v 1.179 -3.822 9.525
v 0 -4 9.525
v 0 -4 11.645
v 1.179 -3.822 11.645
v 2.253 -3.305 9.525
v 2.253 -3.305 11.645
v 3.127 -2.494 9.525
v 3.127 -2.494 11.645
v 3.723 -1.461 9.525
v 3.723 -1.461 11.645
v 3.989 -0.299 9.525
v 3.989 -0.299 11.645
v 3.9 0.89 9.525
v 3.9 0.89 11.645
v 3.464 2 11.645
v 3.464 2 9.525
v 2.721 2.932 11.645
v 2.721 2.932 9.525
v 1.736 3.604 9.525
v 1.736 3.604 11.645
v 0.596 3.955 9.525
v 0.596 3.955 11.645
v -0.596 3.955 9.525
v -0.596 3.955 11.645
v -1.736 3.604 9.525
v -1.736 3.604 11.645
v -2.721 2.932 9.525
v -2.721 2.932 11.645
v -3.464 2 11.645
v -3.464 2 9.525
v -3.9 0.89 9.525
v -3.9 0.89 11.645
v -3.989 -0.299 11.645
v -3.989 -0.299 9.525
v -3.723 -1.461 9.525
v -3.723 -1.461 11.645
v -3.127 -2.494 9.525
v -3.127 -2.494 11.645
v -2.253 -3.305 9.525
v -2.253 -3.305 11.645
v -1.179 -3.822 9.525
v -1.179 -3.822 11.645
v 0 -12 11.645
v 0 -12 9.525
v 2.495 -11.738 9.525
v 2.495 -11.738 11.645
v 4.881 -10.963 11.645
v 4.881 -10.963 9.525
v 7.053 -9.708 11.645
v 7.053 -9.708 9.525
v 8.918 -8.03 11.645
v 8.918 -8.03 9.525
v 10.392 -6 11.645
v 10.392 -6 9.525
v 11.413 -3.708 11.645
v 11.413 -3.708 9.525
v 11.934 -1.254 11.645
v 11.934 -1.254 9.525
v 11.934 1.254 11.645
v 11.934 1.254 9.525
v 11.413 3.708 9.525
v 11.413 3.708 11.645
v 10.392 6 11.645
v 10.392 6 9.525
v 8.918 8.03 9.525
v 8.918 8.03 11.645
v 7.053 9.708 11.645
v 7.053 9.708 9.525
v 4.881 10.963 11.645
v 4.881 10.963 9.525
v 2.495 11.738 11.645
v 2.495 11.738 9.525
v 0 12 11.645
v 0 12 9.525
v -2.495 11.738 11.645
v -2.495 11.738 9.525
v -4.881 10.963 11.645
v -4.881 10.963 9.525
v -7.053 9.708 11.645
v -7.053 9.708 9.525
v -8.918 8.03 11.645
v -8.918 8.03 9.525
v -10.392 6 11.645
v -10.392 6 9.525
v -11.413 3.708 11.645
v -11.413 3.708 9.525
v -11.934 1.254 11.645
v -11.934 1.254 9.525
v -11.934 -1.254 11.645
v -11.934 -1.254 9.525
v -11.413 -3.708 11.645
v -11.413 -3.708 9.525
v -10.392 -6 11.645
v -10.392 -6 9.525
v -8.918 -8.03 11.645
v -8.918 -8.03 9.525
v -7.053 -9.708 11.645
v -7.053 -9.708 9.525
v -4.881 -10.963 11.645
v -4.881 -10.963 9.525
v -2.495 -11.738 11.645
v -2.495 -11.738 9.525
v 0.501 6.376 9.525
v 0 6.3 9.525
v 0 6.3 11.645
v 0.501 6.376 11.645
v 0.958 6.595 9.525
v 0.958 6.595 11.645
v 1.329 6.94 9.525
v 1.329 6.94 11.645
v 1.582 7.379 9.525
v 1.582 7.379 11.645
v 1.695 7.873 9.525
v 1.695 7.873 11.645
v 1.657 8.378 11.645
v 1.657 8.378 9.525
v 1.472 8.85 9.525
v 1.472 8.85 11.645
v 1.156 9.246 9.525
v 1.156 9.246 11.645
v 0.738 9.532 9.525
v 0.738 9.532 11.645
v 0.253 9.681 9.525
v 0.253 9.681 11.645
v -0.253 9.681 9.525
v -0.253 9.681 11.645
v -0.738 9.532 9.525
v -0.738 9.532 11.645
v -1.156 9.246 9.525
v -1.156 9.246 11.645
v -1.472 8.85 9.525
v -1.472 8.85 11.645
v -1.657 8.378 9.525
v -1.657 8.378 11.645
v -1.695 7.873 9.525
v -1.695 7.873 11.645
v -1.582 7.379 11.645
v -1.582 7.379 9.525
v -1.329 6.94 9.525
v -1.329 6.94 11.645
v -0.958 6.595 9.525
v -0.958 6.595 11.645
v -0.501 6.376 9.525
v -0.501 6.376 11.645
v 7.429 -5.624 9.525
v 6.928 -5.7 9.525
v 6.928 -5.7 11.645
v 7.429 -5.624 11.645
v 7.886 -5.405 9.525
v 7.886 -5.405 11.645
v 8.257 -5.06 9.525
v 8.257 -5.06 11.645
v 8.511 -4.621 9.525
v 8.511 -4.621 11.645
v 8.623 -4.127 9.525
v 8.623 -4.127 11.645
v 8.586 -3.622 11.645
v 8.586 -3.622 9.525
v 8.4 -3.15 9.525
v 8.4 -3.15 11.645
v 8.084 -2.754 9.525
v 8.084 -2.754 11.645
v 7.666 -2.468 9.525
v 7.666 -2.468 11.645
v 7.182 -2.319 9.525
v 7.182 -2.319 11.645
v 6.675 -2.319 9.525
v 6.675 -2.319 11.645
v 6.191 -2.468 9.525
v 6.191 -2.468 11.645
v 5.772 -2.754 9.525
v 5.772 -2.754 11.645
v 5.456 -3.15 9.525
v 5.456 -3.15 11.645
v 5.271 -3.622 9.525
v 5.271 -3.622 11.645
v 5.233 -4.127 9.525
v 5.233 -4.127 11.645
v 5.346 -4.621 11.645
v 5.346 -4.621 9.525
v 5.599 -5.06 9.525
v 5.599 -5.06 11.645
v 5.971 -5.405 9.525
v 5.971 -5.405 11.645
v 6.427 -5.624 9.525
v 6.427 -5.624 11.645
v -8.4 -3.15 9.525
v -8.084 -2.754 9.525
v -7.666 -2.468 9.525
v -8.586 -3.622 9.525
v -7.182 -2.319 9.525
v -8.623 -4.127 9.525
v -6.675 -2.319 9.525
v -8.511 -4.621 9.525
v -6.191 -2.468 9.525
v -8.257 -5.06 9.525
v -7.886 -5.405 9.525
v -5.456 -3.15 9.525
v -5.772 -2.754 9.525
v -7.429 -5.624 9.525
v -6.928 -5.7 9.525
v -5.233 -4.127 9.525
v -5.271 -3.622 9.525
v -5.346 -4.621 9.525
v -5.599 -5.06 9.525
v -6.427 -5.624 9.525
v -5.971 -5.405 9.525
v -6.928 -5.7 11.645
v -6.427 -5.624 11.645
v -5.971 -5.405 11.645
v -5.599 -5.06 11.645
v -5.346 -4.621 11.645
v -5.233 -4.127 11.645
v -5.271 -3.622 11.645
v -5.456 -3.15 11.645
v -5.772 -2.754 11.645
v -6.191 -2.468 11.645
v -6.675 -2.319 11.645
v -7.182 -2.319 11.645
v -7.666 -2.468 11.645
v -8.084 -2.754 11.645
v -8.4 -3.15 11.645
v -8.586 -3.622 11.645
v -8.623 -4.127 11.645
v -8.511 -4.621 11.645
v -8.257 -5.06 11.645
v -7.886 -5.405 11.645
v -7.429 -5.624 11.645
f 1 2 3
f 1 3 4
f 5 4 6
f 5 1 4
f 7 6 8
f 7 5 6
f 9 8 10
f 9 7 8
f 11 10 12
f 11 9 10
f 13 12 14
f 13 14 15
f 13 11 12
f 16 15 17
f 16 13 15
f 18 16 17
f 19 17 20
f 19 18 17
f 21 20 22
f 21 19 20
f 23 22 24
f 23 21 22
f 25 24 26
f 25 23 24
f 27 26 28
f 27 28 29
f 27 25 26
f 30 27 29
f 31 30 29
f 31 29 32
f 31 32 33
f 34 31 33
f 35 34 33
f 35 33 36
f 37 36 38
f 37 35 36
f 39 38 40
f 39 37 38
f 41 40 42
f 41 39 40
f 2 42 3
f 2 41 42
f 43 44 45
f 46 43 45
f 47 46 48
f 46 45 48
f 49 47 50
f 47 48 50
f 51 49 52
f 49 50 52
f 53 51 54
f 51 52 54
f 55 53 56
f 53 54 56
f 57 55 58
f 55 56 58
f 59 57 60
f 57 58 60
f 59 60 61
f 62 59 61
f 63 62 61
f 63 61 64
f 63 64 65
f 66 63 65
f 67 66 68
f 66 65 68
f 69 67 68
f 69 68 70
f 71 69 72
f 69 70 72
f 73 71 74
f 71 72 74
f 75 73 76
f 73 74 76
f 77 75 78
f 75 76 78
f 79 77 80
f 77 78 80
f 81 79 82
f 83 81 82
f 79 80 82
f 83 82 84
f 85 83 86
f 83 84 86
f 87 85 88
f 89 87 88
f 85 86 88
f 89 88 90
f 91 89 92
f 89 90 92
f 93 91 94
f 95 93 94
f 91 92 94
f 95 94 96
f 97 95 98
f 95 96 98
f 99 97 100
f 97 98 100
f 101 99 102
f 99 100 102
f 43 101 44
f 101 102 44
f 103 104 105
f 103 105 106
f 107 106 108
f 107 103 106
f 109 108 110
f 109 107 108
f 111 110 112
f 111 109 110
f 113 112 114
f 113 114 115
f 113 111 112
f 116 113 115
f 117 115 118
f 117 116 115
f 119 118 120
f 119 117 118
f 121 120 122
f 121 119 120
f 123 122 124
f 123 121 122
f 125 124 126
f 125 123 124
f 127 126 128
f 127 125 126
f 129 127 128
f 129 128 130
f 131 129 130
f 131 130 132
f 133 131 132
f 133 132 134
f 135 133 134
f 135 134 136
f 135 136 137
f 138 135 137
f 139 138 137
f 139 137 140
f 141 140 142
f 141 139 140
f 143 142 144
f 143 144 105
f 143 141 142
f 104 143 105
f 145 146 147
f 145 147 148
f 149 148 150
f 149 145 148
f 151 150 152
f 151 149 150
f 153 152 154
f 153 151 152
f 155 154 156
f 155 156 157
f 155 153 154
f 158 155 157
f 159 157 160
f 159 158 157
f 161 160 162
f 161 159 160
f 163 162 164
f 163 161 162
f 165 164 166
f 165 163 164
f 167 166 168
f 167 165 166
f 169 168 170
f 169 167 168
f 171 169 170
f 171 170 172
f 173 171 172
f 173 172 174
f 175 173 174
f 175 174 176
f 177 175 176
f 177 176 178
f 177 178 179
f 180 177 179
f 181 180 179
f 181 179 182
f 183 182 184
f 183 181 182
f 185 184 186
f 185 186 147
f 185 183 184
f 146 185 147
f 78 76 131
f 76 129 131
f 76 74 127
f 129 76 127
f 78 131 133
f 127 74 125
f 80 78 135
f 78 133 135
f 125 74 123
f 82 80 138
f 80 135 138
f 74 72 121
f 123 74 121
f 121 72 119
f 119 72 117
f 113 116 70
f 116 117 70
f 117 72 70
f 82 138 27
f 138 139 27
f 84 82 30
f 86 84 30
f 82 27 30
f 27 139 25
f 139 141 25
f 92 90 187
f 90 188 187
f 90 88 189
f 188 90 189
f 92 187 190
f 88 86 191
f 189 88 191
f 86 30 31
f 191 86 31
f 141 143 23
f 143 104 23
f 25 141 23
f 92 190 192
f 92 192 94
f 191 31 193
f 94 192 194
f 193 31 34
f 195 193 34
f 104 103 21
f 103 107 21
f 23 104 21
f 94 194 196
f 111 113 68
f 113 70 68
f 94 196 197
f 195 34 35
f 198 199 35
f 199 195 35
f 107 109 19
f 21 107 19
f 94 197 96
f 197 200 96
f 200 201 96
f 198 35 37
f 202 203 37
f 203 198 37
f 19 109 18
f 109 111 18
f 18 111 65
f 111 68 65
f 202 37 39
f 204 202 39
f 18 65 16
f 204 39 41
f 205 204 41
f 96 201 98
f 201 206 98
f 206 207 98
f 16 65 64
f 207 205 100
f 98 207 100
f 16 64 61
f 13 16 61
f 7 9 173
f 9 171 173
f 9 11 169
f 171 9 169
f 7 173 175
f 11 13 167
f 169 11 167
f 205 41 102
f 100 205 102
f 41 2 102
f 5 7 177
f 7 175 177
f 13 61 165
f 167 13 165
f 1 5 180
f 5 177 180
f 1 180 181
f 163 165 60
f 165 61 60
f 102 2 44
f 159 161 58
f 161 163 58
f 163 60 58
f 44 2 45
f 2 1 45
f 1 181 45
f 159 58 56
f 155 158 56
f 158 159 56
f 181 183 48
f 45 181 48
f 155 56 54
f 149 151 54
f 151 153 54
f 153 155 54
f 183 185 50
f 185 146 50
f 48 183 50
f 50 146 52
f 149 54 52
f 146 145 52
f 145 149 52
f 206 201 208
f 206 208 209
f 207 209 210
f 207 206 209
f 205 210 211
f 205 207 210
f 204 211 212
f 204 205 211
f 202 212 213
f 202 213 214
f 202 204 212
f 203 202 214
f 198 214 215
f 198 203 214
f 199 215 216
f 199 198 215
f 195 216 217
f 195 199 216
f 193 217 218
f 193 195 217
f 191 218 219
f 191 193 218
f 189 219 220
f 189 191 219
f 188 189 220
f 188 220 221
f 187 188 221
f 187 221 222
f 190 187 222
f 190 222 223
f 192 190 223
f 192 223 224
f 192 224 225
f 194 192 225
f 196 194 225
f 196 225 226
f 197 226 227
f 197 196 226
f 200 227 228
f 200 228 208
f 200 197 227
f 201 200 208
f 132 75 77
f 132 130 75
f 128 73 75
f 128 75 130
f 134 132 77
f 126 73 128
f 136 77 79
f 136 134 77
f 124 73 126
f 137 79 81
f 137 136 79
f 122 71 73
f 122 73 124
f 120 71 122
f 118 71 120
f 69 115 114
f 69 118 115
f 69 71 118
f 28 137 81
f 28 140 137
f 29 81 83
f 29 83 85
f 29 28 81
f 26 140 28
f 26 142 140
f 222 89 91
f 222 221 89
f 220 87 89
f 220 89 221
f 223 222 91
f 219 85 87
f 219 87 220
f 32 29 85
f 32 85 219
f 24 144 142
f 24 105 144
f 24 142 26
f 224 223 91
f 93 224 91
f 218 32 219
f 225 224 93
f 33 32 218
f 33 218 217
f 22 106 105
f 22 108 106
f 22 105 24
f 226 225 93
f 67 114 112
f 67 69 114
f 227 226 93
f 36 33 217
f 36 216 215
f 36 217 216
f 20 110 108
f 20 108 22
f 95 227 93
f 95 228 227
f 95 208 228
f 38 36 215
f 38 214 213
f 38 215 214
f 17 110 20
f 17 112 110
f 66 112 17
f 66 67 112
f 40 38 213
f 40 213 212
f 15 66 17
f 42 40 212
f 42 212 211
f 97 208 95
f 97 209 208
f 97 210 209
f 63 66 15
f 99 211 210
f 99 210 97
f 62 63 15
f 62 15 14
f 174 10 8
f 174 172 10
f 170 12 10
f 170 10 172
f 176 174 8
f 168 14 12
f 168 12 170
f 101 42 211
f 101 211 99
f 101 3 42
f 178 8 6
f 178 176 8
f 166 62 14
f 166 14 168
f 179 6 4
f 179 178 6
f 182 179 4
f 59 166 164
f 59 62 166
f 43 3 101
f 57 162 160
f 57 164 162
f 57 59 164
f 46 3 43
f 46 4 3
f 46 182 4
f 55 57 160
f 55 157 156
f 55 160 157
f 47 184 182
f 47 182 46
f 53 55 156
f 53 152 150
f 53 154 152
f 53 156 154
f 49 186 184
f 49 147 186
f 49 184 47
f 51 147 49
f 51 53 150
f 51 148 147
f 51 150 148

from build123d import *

# Parameters (mm, degrees)
BOSS_EXTRUDE1_START = 9.525
SKETCH1_R           = 12
SKETCH1_R_2         = 1.7
SKETCH1_R_3         = 4
BOSS_EXTRUDE1_DEPTH = 2.12


with BuildPart() as part:
    # Sketch1 → Boss-Extrude1 (new body)
    with BuildSketch(Plane.XY.offset(BOSS_EXTRUDE1_START)):
        with Locations(Location((0, 0, 0), (0, 0, 270))):
            Circle(SKETCH1_R)
        with Locations(Location((-6.92820323, -4, 0), (0, 0, 270))):
            Circle(SKETCH1_R_2, mode=Mode.SUBTRACT)
        with Locations(Location((6.92820323, -4, 0), (0, 0, 270))):
            Circle(SKETCH1_R_2, mode=Mode.SUBTRACT)
        with Locations(Location((0, 8, 0), (0, 0, 270))):
            Circle(SKETCH1_R_2, mode=Mode.SUBTRACT)
        with Locations(Location((0, 0, 0), (0, 0, 270))):
            Circle(SKETCH1_R_3, mode=Mode.SUBTRACT)
    extrude(amount=BOSS_EXTRUDE1_DEPTH)


solid = part.part
